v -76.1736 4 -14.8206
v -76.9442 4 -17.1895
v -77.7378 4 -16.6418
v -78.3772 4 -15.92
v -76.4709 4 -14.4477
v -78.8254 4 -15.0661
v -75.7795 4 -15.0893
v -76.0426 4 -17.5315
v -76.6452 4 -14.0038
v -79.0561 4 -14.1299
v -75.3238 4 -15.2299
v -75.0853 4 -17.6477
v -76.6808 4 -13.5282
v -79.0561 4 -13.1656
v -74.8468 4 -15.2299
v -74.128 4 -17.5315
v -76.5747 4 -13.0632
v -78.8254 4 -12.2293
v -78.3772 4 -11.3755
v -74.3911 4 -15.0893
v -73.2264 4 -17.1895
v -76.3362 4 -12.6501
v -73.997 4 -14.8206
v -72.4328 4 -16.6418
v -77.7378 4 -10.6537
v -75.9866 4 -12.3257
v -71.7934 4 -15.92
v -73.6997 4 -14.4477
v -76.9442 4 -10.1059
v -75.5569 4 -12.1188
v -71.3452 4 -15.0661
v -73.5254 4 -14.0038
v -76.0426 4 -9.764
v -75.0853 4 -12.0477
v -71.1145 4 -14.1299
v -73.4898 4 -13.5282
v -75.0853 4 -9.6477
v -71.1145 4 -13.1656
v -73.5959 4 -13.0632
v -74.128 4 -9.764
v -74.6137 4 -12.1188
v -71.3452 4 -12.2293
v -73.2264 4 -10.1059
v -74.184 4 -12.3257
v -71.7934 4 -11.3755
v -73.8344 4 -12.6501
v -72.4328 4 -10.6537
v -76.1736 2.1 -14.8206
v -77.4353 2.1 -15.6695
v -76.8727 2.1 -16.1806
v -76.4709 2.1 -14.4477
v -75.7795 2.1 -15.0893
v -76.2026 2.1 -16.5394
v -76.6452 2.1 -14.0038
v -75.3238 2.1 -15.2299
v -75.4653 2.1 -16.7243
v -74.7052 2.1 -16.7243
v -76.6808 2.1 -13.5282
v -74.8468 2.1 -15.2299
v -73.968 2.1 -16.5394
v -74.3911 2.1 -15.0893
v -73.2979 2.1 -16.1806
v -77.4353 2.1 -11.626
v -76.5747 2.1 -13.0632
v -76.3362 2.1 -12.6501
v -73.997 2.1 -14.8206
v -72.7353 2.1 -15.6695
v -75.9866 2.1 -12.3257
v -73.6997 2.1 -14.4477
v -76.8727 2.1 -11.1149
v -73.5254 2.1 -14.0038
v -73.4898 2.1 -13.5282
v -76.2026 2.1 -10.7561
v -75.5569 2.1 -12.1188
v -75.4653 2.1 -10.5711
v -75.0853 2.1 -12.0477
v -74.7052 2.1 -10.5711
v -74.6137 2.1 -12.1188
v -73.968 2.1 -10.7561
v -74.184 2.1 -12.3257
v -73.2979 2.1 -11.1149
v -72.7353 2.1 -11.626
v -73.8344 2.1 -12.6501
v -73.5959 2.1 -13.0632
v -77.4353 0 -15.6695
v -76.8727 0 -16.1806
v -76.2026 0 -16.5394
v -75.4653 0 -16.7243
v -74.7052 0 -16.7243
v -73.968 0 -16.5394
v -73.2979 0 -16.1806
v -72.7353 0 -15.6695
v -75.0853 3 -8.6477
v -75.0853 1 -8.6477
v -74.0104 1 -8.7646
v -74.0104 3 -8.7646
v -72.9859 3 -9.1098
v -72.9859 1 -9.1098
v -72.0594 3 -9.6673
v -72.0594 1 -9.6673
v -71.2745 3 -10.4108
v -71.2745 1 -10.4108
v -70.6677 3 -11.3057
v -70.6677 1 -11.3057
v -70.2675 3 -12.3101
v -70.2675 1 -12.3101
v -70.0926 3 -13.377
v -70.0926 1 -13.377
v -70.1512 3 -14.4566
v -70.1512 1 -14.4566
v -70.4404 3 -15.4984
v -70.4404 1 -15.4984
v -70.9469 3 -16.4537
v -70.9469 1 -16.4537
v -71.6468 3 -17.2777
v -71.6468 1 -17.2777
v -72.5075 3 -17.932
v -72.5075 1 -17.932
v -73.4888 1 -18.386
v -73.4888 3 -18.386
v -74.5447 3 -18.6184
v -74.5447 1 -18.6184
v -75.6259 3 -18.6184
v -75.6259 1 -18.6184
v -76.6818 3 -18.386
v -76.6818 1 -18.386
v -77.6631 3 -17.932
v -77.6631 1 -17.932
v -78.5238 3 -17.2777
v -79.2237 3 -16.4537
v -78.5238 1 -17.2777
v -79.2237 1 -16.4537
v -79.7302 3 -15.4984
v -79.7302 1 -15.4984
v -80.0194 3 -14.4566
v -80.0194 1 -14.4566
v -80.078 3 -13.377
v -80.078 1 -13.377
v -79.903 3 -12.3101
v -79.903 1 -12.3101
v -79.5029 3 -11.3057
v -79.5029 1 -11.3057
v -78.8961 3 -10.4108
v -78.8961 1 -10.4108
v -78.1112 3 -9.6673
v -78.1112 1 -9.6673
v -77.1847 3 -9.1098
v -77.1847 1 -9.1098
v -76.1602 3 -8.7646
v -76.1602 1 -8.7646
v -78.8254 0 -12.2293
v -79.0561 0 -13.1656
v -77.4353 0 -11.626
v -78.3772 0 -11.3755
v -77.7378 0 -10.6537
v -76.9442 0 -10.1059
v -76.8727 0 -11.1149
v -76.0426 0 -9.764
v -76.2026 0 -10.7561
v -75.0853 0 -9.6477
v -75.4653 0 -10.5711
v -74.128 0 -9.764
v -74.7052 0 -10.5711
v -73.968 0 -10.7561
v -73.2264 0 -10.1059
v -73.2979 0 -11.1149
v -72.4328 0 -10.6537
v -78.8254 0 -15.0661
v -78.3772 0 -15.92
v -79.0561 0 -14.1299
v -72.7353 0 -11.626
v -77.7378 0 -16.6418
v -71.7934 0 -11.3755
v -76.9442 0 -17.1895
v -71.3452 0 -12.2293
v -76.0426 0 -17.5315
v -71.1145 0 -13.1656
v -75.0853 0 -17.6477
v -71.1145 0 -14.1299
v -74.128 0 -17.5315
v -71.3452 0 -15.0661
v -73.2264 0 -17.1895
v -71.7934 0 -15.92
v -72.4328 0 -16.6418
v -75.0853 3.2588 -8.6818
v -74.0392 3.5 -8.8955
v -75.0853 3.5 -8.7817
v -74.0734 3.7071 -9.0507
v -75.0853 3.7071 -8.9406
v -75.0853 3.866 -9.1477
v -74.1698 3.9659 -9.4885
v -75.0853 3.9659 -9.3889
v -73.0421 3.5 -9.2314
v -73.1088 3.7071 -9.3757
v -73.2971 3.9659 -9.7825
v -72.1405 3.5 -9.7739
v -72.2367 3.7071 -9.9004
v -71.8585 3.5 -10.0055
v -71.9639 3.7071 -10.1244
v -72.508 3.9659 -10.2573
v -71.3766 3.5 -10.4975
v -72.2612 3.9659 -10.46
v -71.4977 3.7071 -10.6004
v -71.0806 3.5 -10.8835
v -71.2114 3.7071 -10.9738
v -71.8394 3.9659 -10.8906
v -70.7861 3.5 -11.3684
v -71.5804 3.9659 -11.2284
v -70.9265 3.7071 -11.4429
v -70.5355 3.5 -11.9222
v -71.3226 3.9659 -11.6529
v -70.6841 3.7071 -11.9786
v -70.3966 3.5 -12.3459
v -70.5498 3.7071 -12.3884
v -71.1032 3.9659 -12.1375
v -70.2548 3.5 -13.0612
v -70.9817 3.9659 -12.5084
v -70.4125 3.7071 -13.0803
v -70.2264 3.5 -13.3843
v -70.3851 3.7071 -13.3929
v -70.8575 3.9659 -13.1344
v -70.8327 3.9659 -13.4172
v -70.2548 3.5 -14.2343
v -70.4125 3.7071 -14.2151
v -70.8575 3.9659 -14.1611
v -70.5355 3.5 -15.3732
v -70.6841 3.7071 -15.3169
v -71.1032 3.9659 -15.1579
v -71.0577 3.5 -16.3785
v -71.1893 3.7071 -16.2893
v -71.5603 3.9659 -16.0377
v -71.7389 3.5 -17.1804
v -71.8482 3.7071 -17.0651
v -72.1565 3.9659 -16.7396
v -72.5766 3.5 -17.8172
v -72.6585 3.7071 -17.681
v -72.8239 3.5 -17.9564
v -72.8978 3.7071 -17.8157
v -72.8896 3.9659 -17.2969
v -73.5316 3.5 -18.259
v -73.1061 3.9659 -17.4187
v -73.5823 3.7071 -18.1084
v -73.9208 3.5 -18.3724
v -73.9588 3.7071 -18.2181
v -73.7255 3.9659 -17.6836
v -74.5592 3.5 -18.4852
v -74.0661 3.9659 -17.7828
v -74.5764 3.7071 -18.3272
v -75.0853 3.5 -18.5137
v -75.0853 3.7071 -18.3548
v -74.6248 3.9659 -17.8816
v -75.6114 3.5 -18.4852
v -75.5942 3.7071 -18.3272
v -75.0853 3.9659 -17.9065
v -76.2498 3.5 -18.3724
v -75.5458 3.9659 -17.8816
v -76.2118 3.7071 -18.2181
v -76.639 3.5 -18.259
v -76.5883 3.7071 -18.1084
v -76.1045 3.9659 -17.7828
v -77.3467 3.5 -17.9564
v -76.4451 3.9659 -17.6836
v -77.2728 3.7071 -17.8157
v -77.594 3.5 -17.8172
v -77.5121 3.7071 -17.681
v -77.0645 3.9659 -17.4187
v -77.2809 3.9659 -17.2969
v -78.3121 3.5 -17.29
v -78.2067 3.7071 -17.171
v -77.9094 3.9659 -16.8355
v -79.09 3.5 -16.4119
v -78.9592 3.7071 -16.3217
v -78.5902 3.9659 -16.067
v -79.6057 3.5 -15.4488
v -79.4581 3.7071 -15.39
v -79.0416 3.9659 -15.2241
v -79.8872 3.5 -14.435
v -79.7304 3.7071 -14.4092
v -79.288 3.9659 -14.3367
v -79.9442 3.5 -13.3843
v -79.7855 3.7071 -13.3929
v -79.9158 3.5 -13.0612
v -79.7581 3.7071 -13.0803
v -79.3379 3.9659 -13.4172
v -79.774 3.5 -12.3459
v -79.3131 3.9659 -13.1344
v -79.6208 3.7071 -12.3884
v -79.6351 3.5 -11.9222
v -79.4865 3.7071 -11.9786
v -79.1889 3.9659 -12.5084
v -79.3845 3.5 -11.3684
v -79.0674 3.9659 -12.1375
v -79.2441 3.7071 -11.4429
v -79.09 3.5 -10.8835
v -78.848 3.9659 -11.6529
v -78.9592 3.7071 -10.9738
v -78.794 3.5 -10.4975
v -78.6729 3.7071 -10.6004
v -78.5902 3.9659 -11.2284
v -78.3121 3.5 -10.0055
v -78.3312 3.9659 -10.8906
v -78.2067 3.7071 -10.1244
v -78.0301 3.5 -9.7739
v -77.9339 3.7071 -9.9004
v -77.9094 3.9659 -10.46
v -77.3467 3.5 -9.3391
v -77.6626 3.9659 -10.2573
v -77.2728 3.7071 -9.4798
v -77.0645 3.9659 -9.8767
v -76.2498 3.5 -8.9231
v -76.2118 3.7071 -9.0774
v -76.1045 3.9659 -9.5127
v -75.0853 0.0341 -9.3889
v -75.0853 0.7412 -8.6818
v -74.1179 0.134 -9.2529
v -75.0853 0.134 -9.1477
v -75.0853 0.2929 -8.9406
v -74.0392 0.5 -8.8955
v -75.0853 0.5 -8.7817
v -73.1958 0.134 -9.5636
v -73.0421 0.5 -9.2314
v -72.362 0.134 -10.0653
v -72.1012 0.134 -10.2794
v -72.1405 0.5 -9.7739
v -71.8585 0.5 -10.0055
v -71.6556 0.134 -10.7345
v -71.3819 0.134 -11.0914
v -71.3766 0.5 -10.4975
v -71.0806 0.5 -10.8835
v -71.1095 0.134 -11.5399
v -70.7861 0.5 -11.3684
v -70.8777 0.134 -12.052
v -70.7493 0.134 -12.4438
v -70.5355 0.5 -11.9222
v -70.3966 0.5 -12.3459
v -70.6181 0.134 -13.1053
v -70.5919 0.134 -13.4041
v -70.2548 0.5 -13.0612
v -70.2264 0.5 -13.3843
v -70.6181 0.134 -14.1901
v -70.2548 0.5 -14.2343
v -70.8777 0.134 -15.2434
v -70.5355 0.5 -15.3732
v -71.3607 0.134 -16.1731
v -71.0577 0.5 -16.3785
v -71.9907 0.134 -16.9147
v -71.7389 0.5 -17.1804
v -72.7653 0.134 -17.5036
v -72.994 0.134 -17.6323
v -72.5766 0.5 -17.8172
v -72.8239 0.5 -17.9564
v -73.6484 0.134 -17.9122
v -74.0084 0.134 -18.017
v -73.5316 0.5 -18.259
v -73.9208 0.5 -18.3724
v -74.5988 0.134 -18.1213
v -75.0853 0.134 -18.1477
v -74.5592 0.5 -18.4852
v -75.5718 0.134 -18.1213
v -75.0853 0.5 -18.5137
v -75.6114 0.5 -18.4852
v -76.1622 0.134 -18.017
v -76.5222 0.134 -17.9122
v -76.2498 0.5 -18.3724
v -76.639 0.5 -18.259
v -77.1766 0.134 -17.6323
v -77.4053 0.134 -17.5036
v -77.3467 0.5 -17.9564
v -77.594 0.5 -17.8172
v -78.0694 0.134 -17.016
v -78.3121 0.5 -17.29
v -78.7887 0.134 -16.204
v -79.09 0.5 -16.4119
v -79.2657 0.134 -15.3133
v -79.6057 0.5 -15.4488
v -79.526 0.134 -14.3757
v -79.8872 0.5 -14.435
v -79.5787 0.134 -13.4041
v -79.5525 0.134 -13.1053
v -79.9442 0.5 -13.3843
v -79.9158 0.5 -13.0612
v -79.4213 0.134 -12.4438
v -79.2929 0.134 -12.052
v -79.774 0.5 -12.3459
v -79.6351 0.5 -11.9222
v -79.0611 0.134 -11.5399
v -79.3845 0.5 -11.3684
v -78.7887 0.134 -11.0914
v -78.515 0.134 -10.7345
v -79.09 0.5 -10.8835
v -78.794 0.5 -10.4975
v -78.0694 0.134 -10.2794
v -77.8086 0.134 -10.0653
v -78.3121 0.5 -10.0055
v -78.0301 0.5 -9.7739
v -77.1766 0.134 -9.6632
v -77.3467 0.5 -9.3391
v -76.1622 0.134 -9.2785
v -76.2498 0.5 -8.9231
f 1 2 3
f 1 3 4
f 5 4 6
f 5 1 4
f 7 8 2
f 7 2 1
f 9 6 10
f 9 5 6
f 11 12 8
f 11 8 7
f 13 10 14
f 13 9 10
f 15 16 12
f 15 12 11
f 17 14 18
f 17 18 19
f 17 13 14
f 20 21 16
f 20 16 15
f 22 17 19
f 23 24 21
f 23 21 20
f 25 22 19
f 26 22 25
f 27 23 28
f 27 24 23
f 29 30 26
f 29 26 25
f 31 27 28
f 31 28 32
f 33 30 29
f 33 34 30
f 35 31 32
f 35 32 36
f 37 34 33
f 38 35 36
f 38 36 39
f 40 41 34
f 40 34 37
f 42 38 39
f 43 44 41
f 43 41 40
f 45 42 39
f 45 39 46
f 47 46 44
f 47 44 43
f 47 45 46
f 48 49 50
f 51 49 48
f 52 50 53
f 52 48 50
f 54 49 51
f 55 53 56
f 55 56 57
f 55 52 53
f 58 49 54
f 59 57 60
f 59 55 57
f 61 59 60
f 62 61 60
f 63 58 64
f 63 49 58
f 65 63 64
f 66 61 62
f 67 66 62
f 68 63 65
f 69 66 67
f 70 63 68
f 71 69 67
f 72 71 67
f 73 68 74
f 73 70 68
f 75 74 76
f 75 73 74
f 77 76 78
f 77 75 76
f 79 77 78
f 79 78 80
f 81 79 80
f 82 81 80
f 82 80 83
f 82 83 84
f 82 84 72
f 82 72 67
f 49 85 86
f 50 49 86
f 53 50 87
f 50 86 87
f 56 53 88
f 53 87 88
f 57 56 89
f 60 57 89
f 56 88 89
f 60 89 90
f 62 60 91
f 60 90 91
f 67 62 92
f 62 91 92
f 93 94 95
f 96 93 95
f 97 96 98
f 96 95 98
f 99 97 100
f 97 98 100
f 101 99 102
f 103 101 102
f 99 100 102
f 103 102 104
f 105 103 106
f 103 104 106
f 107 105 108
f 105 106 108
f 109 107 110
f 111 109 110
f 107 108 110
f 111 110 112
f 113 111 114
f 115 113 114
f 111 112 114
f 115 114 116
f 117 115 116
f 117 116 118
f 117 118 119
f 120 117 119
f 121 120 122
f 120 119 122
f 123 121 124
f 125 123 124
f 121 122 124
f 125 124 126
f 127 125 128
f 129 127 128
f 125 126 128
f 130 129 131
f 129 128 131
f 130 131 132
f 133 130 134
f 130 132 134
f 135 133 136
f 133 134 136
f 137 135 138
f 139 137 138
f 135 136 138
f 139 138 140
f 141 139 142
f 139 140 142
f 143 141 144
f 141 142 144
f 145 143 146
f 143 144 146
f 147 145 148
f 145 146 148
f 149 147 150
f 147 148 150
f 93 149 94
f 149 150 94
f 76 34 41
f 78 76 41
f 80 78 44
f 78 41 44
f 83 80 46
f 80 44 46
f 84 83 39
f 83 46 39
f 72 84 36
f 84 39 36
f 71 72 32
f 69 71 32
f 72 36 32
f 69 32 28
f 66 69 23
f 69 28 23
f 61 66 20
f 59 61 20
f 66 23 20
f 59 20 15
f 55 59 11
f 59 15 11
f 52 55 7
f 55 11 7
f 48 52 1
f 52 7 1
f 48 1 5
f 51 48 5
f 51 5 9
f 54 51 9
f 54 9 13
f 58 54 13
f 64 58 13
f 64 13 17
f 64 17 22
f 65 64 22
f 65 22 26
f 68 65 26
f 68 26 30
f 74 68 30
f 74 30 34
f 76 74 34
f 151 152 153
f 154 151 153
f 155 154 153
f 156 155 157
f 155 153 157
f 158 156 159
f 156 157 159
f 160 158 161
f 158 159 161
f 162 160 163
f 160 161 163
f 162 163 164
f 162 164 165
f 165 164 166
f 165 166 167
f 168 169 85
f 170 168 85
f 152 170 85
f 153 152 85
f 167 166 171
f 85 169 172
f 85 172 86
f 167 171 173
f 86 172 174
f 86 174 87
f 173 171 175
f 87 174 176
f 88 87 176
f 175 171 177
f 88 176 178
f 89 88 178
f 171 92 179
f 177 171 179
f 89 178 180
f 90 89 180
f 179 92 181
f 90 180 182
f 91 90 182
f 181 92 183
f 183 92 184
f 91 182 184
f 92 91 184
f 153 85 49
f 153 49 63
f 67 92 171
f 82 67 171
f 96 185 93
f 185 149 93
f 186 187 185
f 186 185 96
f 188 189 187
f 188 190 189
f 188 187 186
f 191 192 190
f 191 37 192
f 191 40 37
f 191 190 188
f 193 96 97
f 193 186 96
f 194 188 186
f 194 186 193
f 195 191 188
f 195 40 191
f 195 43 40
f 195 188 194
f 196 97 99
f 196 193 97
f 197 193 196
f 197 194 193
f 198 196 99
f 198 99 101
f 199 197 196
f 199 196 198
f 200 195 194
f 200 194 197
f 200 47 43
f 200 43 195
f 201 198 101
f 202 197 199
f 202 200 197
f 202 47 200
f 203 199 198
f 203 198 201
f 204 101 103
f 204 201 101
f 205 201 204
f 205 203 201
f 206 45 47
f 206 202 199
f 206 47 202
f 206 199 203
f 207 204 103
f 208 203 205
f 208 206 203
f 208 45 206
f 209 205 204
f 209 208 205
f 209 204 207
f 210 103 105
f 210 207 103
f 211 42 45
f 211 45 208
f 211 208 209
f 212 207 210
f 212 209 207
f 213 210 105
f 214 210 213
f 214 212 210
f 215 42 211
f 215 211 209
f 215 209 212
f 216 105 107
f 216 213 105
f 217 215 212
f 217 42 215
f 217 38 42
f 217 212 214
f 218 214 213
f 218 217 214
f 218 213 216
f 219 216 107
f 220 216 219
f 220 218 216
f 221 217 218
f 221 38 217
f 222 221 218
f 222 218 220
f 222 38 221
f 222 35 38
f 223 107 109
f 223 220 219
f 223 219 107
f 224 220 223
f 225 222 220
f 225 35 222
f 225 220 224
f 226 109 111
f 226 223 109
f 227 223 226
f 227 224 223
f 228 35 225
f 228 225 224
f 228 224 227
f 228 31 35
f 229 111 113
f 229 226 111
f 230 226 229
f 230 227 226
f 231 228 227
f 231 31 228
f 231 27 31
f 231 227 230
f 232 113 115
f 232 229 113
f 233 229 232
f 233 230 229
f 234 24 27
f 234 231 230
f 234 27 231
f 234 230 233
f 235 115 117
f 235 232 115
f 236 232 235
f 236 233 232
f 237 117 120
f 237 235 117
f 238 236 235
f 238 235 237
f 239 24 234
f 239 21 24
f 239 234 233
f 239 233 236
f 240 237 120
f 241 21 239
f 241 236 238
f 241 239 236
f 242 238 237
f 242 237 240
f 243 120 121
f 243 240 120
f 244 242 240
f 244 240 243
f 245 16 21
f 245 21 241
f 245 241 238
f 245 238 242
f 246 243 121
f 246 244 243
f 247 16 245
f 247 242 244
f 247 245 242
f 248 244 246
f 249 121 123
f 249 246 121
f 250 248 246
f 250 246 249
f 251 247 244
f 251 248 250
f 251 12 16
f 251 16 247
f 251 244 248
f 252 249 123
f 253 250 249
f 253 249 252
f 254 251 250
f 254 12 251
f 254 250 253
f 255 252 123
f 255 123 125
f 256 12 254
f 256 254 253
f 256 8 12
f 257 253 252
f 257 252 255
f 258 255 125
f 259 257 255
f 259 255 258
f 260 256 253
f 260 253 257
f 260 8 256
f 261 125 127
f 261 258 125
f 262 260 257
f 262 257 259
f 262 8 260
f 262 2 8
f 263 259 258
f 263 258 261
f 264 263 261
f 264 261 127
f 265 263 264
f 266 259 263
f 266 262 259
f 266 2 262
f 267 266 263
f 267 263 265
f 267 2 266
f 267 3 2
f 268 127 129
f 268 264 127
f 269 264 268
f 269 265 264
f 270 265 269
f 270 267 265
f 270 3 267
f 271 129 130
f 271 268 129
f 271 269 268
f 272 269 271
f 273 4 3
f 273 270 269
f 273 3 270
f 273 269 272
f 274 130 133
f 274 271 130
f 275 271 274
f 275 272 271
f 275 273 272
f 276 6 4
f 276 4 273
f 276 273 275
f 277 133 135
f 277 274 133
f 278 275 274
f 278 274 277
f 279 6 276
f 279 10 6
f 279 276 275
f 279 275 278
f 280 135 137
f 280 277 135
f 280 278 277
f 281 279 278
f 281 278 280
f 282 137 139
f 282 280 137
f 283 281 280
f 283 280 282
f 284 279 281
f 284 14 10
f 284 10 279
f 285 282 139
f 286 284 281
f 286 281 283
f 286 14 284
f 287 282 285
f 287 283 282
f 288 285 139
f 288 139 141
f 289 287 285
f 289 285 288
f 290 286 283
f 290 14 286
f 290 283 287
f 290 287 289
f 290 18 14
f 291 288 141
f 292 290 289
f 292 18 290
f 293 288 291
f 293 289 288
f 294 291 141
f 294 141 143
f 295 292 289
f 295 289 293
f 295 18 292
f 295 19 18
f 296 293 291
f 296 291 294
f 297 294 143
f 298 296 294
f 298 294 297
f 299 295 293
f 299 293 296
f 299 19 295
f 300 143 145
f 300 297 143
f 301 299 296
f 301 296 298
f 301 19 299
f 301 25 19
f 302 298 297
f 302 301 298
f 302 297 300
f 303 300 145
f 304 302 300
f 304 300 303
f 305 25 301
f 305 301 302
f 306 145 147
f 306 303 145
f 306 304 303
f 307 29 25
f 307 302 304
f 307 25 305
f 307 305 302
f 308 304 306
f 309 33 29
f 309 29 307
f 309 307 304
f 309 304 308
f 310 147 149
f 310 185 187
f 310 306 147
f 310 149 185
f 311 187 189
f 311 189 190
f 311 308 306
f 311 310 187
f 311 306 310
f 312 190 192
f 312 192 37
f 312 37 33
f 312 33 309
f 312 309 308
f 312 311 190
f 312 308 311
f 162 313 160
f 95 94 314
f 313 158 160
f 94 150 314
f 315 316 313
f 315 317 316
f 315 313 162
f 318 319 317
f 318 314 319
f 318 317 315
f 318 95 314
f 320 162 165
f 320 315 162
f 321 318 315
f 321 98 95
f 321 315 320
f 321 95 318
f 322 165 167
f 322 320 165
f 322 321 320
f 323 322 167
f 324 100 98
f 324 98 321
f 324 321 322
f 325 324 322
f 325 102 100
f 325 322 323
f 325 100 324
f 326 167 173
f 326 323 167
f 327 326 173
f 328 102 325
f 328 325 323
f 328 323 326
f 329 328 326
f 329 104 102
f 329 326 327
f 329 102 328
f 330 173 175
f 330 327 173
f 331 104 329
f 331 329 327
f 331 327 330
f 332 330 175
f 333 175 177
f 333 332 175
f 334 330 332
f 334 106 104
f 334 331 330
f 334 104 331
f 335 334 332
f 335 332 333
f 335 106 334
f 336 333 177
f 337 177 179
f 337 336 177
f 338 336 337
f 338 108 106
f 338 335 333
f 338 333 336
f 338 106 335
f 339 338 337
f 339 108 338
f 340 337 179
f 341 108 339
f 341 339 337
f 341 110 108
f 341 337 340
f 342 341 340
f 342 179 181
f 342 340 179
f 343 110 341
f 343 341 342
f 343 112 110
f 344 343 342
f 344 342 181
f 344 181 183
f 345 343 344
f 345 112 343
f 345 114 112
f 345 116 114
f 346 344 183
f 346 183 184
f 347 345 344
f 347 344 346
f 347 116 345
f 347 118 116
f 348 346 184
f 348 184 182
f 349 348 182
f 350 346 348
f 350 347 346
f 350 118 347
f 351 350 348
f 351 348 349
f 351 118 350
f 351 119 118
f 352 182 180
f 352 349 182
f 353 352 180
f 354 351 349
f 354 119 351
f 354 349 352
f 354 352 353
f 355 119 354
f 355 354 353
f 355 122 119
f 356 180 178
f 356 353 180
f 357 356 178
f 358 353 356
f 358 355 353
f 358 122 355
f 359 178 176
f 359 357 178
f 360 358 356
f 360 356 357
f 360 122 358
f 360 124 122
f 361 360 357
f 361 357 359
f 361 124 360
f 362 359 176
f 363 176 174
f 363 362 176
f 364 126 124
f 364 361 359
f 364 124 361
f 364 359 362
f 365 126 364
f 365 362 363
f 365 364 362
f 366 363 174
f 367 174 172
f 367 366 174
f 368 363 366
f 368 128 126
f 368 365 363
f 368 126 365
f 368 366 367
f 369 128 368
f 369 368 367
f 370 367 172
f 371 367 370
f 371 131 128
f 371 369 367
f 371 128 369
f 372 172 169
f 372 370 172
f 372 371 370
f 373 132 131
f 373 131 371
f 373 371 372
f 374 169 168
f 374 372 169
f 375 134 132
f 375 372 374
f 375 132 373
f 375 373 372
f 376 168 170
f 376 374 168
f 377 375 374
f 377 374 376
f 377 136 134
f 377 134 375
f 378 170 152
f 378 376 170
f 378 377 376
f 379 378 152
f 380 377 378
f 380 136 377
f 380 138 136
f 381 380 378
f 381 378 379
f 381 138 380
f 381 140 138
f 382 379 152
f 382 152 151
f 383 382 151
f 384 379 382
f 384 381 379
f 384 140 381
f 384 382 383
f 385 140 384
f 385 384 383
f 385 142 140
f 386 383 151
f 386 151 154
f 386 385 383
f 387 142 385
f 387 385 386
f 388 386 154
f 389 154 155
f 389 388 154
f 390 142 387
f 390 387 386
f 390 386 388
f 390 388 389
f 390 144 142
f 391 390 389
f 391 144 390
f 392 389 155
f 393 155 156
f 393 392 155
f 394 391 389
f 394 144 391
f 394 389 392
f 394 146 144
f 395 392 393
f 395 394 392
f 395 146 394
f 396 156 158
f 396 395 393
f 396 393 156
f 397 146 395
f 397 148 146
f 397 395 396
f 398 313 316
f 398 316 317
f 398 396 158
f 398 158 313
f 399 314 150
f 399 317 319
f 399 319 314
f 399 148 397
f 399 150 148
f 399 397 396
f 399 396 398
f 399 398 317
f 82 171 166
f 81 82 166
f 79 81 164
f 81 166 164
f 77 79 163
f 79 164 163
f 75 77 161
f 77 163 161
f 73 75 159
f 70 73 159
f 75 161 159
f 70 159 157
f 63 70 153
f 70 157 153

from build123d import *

# Parameters (mm, degrees)
SKETCH_1_R          = 5
SKETCH_1_R_2        = 3.1
SKETCH_1_W          = 4.2
SKETCH_1_H          = 4.5607017
EXTRUDE_1_DEPTH     = 4
SKETCH_2_W          = 4.7
SKETCH_2_H          = 4.043513324
CUT_EXTRUDE_1_DEPTH = 2.1
SKETCH_3_R          = 1.6
CUT_EXTRUDE_2_DEPTH = 3
FILLET_1_R          = 1


with BuildPart() as part:
    # ｽｹｯﾁ1 → ﾎﾞｽ - 押し出し1 (new body)
    # profile 1 of 6: a face of its own
    with BuildSketch(Plane(origin=(0, 0, 0), x_dir=(1, 0, 0), z_dir=(0, 1, 0))):
        with Locations(Location((-75.085298438, 13.647723363, 0), (0, 0, 270))):
            Circle(SKETCH_1_R)
        with Locations((-75.085298438, 13.647723363)):
            Circle(SKETCH_1_R_2, mode=Mode.SUBTRACT)
    # profile 2 of 6: a face of its own
    with BuildSketch(Plane(origin=(0, 0, 0), x_dir=(1, 0, 0), z_dir=(0, 1, 0))):
        with BuildLine():
            ThreePointArc((-71.985298438, 13.647723363), (-72.246284525, 14.892713323), (-72.985298438, 15.928074213))
            Line((-72.985298438, 15.928074213), (-72.985298438, 11.367372513))
            ThreePointArc((-72.985298438, 11.367372513), (-72.246284525, 12.402733403), (-71.985298438, 13.647723363))
        make_face()
    # profile 3 of 6: a face of its own
    with BuildSketch(Plane(origin=(0, 0, 0), x_dir=(1, 0, 0), z_dir=(0, 1, 0))):
        with BuildLine():
            Line((-77.185298438, 11.367372513), (-77.185298438, 15.928074213))
            ThreePointArc((-77.185298438, 15.928074213), (-78.185298438, 13.647723363), (-77.185298438, 11.367372513))
        make_face()
    # profile 4 of 6: a face of its own
    with BuildSketch(Plane(origin=(0, 0, 0), x_dir=(1, 0, 0), z_dir=(0, 1, 0))):
        with BuildLine():
            ThreePointArc((-72.985298438, 15.928074213), (-75.085298438, 16.747723363), (-77.185298438, 15.928074213))
            Line((-77.185298438, 15.928074213), (-72.985298438, 15.928074213))
        make_face()
    # profile 5 of 6: a face of its own
    with BuildSketch(Plane(origin=(0, 0, 0), x_dir=(1, 0, 0), z_dir=(0, 1, 0))):
        with Locations((-75.085298438, 13.647723363)):
            Rectangle(SKETCH_1_W, SKETCH_1_H)
    # profile 6 of 6: a face of its own
    with BuildSketch(Plane(origin=(0, 0, 0), x_dir=(1, 0, 0), z_dir=(0, 1, 0))):
        with BuildLine():
            Line((-72.985298438, 11.367372513), (-77.185298438, 11.367372513))
            ThreePointArc((-77.185298438, 11.367372513), (-75.085298438, 10.547723363), (-72.985298438, 11.367372513))
        make_face()
    extrude(amount=EXTRUDE_1_DEPTH)

    # ｽｹｯﾁ2 → ｶｯﾄ - 押し出し1 (cut)
    with BuildSketch(Plane.XZ):
        with Locations((-75.085298438, -13.647723363)):
            Rectangle(SKETCH_2_W, SKETCH_2_H)
        with BuildLine():
            ThreePointArc((-72.735298438, -11.625966701), (-75.085298438, -10.547723363), (-77.435298438, -11.625966701))
            Line((-77.435298438, -11.625966701), (-72.735298438, -11.625966701))
        make_face()
        with BuildLine():
            Line((-72.735298438, -15.669480025), (-77.435298438, -15.669480025))
            ThreePointArc((-77.435298438, -15.669480025), (-75.085298438, -16.747723363), (-72.735298438, -15.669480025))
        make_face()
    extrude(amount=-CUT_EXTRUDE_1_DEPTH, mode=Mode.SUBTRACT)

    # ｽｹｯﾁ3 → ｶｯﾄ - 押し出し2 (cut)
    with BuildSketch(Plane(origin=(0, 4, 0), x_dir=(1, 0, 0), z_dir=(0, 1, 0))):
        with Locations(Location((-75.085298438, 13.647723363, 0), (0, 0, 270))):
            Circle(SKETCH_3_R)
    extrude(amount=-CUT_EXTRUDE_2_DEPTH, mode=Mode.SUBTRACT)

    # ﾌｨﾚｯﾄ1
    fillet_1_edges = [part.edges().sort_by_distance(p)[0] for p in [
        (-75.085298438, 0, -18.647723363),
        (-75.085298438, 4, -18.647723363),
    ]]
    fillet(fillet_1_edges, radius=FILLET_1_R)


solid = part.part
